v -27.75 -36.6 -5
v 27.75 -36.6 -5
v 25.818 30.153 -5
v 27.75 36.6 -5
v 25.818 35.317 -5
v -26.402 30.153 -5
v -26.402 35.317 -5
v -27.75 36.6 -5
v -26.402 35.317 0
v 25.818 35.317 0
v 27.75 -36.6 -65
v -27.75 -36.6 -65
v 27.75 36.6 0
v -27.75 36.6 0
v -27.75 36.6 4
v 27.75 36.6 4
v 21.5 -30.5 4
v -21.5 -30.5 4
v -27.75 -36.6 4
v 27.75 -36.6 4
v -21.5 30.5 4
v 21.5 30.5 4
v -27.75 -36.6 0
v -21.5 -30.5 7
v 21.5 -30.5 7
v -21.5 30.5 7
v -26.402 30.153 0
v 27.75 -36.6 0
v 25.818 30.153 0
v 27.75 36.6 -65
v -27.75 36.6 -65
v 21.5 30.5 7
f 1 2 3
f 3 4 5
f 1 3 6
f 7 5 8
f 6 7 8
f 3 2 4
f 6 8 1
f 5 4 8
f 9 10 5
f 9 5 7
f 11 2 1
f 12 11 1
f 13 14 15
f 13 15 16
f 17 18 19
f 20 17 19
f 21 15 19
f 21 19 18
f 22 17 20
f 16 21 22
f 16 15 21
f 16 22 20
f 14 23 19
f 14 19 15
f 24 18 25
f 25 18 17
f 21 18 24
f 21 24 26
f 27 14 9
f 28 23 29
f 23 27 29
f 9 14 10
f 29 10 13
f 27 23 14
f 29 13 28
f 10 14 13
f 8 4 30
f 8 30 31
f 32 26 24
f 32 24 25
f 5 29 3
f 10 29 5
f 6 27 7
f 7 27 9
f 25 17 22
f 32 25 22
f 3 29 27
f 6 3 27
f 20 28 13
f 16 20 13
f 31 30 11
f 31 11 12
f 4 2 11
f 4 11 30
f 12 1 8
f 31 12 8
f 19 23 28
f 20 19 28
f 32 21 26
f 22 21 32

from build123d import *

# Parameters (mm, degrees)
SKETCH1_W           = 55.5
SKETCH1_H           = 73.2
BOSS_EXTRUDE1_DEPTH = 4
SKETCH2_W           = 52.220028237
SKETCH2_H           = 5.163547568
BOSS_EXTRUDE2_DEPTH = 5
SKETCH3_W           = 43
SKETCH3_H           = 61
BOSS_EXTRUDE3_DEPTH = 3
SKETCH4_W           = 55.5
SKETCH4_H           = 73.2
BOSS_EXTRUDE4_DEPTH = 60


with BuildPart() as part:
    # Sketch1 → Boss-Extrude1 (new body)
    with BuildSketch(Plane.XY):
        Rectangle(SKETCH1_W, SKETCH1_H)
    extrude(amount=BOSS_EXTRUDE1_DEPTH)

    # Sketch2 → Boss-Extrude2 (add)
    with BuildSketch(Plane(origin=(0, 0, 0), x_dir=(-1, 0, 0), z_dir=(0, 0, -1))):
        with Locations((0.292276277, 32.734943074)):
            Rectangle(SKETCH2_W, SKETCH2_H)
    extrude(amount=BOSS_EXTRUDE2_DEPTH)

    # Sketch3 → Boss-Extrude3 (add)
    with BuildSketch(Plane.XY.offset(4)):
        Rectangle(SKETCH3_W, SKETCH3_H)
    extrude(amount=BOSS_EXTRUDE3_DEPTH)

    # Sketch4 → Boss-Extrude4 (add)
    with BuildSketch(Plane(origin=(0, 0, -5), x_dir=(-1, 0, 0), z_dir=(0, 0, -1))):
        Rectangle(SKETCH4_W, SKETCH4_H)
    extrude(amount=BOSS_EXTRUDE4_DEPTH)


solid = part.part
